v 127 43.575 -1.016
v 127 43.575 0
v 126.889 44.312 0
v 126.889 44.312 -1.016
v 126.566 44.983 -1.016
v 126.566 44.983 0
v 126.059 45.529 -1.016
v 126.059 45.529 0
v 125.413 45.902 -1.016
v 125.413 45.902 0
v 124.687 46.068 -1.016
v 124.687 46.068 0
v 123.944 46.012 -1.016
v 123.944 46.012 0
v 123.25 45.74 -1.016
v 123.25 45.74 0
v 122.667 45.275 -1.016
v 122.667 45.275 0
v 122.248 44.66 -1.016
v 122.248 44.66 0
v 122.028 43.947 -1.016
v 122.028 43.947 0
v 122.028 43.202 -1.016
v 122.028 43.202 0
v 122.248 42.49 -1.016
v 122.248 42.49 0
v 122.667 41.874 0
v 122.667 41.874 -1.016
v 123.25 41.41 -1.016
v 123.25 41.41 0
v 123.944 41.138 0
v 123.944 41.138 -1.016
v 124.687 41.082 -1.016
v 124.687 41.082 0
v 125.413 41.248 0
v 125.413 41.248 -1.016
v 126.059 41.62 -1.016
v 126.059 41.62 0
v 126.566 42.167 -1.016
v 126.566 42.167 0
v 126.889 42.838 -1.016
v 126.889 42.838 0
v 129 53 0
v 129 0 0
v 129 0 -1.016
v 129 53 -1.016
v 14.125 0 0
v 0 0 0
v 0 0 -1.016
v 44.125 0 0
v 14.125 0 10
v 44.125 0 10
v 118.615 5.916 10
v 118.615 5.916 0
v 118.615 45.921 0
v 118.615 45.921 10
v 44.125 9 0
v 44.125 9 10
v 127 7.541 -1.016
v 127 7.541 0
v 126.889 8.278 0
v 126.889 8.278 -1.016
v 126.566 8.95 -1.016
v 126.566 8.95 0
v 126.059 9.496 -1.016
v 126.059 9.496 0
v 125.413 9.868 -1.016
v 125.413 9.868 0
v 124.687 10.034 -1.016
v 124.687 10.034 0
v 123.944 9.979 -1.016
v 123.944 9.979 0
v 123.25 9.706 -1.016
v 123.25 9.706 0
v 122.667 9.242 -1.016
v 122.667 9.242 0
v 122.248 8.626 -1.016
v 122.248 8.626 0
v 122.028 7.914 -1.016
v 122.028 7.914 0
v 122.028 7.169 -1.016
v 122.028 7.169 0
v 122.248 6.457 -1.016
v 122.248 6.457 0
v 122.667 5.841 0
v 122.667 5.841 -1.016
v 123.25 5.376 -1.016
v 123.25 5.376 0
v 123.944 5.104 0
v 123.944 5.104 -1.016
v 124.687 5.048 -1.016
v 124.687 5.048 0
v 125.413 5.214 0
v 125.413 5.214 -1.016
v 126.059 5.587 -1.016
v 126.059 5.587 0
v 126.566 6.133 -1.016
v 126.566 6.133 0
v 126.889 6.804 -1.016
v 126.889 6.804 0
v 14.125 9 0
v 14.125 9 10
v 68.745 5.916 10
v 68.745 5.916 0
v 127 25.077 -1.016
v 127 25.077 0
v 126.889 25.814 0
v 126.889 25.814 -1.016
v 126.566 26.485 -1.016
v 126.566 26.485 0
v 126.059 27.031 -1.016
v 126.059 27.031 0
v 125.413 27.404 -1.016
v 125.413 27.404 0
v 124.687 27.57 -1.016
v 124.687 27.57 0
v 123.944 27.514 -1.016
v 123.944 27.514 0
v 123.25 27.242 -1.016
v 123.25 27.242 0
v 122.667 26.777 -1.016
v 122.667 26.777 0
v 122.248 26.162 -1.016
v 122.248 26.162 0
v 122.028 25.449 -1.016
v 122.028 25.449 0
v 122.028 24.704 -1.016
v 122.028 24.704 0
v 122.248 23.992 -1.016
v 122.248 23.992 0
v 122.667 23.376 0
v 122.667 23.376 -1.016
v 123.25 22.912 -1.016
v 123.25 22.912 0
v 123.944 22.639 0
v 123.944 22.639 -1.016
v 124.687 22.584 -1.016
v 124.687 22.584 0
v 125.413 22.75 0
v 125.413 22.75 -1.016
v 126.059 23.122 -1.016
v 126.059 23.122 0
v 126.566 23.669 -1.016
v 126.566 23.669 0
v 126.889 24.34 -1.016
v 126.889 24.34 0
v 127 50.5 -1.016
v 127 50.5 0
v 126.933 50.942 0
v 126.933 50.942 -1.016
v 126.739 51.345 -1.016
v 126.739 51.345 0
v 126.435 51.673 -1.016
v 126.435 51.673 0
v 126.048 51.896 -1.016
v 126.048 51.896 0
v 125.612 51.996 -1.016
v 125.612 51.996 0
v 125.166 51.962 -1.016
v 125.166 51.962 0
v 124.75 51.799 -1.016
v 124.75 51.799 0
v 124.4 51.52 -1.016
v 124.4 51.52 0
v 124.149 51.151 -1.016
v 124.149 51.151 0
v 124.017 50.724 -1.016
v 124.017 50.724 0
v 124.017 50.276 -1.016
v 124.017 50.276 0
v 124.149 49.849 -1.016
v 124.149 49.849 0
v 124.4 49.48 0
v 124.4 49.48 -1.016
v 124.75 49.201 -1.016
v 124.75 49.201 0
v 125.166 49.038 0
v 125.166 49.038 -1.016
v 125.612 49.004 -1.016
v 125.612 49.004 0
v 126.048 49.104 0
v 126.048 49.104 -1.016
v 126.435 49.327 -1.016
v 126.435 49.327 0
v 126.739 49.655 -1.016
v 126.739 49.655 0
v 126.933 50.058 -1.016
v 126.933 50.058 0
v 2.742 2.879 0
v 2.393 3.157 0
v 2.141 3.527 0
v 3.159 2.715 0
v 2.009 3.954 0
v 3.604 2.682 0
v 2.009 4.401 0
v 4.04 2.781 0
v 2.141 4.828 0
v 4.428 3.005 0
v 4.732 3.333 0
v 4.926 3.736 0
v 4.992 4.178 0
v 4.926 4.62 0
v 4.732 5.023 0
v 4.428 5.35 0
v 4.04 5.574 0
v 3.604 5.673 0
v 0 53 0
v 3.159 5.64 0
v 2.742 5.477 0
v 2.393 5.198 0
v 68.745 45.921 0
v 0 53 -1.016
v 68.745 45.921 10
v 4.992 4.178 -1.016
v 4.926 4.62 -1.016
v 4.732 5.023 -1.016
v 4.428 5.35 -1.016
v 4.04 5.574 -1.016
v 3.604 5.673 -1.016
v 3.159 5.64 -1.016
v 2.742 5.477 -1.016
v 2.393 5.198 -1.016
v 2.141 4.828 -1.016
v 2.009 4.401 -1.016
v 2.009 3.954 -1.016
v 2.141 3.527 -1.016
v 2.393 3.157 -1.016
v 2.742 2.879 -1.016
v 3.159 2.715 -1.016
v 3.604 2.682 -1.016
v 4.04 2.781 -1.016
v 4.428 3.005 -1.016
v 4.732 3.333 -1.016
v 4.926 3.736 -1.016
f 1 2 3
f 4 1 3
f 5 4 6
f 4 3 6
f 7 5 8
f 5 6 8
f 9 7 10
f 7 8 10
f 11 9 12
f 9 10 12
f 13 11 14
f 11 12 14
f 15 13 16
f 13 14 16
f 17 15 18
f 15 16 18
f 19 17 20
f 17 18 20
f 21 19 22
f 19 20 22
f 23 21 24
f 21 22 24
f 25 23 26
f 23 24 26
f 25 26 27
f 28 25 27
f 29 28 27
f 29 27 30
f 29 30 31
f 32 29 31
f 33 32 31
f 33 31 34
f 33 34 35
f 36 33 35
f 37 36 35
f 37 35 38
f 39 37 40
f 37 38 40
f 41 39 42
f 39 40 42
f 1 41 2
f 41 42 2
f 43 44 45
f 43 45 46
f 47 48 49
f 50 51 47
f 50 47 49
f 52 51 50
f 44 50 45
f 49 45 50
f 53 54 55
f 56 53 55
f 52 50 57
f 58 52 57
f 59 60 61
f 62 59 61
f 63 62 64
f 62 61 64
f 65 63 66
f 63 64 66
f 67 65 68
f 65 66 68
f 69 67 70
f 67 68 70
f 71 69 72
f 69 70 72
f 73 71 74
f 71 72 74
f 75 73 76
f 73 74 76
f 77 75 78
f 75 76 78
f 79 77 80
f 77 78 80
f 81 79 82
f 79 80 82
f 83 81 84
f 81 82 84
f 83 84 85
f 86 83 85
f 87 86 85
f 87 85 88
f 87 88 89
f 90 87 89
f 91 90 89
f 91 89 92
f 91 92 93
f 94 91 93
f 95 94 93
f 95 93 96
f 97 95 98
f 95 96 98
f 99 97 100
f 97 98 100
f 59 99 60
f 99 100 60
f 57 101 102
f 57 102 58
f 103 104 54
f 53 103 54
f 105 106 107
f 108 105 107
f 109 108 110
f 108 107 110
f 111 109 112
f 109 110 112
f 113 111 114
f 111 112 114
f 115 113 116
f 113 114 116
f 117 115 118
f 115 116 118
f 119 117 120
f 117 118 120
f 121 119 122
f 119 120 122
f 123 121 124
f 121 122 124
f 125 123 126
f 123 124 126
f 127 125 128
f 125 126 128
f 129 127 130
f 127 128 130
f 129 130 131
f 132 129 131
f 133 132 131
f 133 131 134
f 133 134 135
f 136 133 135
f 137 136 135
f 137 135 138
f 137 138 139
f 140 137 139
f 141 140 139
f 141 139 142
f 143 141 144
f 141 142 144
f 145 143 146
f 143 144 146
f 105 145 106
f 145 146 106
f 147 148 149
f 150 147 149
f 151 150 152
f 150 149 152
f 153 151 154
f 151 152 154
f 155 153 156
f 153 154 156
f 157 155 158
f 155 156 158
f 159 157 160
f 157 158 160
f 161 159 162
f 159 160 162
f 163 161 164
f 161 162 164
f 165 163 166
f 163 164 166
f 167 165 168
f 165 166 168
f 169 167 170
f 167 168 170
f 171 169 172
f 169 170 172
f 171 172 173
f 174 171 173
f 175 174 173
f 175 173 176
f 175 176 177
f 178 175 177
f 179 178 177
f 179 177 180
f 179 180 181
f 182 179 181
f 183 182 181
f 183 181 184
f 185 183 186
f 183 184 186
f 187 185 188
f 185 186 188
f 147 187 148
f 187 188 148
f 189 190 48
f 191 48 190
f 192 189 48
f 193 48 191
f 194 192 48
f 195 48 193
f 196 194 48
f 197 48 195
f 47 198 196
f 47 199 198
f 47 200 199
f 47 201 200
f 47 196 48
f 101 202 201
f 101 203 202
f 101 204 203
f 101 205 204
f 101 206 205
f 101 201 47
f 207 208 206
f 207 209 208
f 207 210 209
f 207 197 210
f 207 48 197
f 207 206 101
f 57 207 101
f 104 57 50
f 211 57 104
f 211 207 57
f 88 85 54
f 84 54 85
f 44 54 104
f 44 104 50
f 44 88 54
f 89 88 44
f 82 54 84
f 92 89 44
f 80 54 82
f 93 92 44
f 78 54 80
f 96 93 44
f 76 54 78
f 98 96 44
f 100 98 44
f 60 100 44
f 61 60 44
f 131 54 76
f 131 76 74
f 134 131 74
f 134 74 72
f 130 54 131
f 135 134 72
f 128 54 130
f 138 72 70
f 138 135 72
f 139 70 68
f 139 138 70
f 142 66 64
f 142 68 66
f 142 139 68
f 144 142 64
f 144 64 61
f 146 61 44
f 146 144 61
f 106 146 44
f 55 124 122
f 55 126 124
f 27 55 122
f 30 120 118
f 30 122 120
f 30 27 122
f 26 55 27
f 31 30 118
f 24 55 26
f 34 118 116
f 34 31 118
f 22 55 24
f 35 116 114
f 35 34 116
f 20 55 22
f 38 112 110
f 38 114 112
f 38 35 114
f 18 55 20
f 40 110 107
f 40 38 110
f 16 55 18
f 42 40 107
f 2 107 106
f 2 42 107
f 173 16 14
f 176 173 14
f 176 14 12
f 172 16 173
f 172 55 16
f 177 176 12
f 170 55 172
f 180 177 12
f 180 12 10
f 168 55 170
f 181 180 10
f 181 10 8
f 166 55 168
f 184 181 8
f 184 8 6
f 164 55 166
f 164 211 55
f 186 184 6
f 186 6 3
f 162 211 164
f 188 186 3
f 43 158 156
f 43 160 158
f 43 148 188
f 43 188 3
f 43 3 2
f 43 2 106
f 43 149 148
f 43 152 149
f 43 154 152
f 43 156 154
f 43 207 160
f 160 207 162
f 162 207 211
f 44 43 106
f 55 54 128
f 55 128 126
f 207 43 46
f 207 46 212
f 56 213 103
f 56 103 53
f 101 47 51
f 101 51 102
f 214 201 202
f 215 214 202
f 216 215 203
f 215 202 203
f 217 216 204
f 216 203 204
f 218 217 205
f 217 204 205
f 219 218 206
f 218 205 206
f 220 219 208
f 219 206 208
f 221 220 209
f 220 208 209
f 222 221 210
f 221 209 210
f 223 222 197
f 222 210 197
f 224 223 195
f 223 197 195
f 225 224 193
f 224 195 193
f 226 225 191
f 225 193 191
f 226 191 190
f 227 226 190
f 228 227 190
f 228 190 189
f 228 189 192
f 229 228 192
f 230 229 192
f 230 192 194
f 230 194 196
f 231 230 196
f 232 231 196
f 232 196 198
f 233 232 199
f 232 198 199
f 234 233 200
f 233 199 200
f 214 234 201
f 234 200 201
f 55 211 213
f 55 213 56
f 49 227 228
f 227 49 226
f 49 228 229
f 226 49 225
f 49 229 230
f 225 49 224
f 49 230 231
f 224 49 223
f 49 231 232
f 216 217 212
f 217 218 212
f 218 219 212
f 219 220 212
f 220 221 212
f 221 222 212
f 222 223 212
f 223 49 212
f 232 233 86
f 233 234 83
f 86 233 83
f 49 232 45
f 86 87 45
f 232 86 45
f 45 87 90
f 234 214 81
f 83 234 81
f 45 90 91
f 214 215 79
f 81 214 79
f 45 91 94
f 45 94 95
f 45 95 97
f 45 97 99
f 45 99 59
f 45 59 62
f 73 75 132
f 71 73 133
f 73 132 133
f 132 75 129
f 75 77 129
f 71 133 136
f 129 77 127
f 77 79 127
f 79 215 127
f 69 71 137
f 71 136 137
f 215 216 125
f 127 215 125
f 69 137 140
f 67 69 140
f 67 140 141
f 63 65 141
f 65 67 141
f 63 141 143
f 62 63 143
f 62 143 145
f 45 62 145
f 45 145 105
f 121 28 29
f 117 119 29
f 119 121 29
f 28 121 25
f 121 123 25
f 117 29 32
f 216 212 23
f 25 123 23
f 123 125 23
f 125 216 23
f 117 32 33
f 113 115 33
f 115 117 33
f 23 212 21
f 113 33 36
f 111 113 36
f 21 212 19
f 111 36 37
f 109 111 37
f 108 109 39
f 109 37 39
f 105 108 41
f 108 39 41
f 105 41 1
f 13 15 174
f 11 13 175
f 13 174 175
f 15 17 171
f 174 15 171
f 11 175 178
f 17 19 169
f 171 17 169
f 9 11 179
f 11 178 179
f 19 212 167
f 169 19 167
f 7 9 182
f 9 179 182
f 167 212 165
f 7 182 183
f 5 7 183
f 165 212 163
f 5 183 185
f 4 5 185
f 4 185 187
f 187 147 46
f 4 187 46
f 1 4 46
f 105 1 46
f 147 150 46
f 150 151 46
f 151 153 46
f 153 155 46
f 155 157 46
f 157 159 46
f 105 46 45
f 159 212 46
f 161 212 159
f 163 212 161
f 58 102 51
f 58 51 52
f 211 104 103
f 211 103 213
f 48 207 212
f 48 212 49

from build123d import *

# Parameters (mm, degrees)
F0_R     = 1.5
F0_R_2   = 2.5
F0_W     = 49.869843
F0_H     = 40.004894
F0_W_2   = 30
F0_H_2   = 9
F1_DEPTH = 1.016
F2_DEPTH = 10


with BuildPart() as f1:
    # F0 (on Top) → F1 (new body)
    with BuildSketch(Plane.XY):
        Polygon((0, 53), (0, 0), (14.124727, 0), (14.124727, 9), (44.124727, 9), (44.124727, 0), (129, 0), (129, 53), align=None)
        with Locations((3.492343, 4.177653)):
            Circle(F0_R, mode=Mode.SUBTRACT)
        with Locations((124.5, 7.541248)):
            Circle(F0_R_2, mode=Mode.SUBTRACT)
        with Locations((93.68017, 25.918216)):
            Rectangle(F0_W, F0_H, mode=Mode.SUBTRACT)
        with Locations((124.5, 25.076802)):
            Circle(F0_R_2, mode=Mode.SUBTRACT)
        with Locations((124.5, 43.574877)):
            Circle(F0_R_2, mode=Mode.SUBTRACT)
        with Locations((125.5, 50.5)):
            Circle(F0_R, mode=Mode.SUBTRACT)
        with Locations((93.68017, 25.918216)):
            Rectangle(F0_W, F0_H)
        with Locations((29.124727, 4.5)):
            Rectangle(F0_W_2, F0_H_2)
    extrude(amount=-F1_DEPTH)

    # F0 (on Top) → F2 (join)
    with BuildSketch(Plane.XY):
        with Locations((29.124727, 4.5)):
            Rectangle(F0_W_2, F0_H_2)
        with Locations((93.68017, 25.918216)):
            Rectangle(F0_W, F0_H)
    extrude(amount=F2_DEPTH)


solid = f1.part
